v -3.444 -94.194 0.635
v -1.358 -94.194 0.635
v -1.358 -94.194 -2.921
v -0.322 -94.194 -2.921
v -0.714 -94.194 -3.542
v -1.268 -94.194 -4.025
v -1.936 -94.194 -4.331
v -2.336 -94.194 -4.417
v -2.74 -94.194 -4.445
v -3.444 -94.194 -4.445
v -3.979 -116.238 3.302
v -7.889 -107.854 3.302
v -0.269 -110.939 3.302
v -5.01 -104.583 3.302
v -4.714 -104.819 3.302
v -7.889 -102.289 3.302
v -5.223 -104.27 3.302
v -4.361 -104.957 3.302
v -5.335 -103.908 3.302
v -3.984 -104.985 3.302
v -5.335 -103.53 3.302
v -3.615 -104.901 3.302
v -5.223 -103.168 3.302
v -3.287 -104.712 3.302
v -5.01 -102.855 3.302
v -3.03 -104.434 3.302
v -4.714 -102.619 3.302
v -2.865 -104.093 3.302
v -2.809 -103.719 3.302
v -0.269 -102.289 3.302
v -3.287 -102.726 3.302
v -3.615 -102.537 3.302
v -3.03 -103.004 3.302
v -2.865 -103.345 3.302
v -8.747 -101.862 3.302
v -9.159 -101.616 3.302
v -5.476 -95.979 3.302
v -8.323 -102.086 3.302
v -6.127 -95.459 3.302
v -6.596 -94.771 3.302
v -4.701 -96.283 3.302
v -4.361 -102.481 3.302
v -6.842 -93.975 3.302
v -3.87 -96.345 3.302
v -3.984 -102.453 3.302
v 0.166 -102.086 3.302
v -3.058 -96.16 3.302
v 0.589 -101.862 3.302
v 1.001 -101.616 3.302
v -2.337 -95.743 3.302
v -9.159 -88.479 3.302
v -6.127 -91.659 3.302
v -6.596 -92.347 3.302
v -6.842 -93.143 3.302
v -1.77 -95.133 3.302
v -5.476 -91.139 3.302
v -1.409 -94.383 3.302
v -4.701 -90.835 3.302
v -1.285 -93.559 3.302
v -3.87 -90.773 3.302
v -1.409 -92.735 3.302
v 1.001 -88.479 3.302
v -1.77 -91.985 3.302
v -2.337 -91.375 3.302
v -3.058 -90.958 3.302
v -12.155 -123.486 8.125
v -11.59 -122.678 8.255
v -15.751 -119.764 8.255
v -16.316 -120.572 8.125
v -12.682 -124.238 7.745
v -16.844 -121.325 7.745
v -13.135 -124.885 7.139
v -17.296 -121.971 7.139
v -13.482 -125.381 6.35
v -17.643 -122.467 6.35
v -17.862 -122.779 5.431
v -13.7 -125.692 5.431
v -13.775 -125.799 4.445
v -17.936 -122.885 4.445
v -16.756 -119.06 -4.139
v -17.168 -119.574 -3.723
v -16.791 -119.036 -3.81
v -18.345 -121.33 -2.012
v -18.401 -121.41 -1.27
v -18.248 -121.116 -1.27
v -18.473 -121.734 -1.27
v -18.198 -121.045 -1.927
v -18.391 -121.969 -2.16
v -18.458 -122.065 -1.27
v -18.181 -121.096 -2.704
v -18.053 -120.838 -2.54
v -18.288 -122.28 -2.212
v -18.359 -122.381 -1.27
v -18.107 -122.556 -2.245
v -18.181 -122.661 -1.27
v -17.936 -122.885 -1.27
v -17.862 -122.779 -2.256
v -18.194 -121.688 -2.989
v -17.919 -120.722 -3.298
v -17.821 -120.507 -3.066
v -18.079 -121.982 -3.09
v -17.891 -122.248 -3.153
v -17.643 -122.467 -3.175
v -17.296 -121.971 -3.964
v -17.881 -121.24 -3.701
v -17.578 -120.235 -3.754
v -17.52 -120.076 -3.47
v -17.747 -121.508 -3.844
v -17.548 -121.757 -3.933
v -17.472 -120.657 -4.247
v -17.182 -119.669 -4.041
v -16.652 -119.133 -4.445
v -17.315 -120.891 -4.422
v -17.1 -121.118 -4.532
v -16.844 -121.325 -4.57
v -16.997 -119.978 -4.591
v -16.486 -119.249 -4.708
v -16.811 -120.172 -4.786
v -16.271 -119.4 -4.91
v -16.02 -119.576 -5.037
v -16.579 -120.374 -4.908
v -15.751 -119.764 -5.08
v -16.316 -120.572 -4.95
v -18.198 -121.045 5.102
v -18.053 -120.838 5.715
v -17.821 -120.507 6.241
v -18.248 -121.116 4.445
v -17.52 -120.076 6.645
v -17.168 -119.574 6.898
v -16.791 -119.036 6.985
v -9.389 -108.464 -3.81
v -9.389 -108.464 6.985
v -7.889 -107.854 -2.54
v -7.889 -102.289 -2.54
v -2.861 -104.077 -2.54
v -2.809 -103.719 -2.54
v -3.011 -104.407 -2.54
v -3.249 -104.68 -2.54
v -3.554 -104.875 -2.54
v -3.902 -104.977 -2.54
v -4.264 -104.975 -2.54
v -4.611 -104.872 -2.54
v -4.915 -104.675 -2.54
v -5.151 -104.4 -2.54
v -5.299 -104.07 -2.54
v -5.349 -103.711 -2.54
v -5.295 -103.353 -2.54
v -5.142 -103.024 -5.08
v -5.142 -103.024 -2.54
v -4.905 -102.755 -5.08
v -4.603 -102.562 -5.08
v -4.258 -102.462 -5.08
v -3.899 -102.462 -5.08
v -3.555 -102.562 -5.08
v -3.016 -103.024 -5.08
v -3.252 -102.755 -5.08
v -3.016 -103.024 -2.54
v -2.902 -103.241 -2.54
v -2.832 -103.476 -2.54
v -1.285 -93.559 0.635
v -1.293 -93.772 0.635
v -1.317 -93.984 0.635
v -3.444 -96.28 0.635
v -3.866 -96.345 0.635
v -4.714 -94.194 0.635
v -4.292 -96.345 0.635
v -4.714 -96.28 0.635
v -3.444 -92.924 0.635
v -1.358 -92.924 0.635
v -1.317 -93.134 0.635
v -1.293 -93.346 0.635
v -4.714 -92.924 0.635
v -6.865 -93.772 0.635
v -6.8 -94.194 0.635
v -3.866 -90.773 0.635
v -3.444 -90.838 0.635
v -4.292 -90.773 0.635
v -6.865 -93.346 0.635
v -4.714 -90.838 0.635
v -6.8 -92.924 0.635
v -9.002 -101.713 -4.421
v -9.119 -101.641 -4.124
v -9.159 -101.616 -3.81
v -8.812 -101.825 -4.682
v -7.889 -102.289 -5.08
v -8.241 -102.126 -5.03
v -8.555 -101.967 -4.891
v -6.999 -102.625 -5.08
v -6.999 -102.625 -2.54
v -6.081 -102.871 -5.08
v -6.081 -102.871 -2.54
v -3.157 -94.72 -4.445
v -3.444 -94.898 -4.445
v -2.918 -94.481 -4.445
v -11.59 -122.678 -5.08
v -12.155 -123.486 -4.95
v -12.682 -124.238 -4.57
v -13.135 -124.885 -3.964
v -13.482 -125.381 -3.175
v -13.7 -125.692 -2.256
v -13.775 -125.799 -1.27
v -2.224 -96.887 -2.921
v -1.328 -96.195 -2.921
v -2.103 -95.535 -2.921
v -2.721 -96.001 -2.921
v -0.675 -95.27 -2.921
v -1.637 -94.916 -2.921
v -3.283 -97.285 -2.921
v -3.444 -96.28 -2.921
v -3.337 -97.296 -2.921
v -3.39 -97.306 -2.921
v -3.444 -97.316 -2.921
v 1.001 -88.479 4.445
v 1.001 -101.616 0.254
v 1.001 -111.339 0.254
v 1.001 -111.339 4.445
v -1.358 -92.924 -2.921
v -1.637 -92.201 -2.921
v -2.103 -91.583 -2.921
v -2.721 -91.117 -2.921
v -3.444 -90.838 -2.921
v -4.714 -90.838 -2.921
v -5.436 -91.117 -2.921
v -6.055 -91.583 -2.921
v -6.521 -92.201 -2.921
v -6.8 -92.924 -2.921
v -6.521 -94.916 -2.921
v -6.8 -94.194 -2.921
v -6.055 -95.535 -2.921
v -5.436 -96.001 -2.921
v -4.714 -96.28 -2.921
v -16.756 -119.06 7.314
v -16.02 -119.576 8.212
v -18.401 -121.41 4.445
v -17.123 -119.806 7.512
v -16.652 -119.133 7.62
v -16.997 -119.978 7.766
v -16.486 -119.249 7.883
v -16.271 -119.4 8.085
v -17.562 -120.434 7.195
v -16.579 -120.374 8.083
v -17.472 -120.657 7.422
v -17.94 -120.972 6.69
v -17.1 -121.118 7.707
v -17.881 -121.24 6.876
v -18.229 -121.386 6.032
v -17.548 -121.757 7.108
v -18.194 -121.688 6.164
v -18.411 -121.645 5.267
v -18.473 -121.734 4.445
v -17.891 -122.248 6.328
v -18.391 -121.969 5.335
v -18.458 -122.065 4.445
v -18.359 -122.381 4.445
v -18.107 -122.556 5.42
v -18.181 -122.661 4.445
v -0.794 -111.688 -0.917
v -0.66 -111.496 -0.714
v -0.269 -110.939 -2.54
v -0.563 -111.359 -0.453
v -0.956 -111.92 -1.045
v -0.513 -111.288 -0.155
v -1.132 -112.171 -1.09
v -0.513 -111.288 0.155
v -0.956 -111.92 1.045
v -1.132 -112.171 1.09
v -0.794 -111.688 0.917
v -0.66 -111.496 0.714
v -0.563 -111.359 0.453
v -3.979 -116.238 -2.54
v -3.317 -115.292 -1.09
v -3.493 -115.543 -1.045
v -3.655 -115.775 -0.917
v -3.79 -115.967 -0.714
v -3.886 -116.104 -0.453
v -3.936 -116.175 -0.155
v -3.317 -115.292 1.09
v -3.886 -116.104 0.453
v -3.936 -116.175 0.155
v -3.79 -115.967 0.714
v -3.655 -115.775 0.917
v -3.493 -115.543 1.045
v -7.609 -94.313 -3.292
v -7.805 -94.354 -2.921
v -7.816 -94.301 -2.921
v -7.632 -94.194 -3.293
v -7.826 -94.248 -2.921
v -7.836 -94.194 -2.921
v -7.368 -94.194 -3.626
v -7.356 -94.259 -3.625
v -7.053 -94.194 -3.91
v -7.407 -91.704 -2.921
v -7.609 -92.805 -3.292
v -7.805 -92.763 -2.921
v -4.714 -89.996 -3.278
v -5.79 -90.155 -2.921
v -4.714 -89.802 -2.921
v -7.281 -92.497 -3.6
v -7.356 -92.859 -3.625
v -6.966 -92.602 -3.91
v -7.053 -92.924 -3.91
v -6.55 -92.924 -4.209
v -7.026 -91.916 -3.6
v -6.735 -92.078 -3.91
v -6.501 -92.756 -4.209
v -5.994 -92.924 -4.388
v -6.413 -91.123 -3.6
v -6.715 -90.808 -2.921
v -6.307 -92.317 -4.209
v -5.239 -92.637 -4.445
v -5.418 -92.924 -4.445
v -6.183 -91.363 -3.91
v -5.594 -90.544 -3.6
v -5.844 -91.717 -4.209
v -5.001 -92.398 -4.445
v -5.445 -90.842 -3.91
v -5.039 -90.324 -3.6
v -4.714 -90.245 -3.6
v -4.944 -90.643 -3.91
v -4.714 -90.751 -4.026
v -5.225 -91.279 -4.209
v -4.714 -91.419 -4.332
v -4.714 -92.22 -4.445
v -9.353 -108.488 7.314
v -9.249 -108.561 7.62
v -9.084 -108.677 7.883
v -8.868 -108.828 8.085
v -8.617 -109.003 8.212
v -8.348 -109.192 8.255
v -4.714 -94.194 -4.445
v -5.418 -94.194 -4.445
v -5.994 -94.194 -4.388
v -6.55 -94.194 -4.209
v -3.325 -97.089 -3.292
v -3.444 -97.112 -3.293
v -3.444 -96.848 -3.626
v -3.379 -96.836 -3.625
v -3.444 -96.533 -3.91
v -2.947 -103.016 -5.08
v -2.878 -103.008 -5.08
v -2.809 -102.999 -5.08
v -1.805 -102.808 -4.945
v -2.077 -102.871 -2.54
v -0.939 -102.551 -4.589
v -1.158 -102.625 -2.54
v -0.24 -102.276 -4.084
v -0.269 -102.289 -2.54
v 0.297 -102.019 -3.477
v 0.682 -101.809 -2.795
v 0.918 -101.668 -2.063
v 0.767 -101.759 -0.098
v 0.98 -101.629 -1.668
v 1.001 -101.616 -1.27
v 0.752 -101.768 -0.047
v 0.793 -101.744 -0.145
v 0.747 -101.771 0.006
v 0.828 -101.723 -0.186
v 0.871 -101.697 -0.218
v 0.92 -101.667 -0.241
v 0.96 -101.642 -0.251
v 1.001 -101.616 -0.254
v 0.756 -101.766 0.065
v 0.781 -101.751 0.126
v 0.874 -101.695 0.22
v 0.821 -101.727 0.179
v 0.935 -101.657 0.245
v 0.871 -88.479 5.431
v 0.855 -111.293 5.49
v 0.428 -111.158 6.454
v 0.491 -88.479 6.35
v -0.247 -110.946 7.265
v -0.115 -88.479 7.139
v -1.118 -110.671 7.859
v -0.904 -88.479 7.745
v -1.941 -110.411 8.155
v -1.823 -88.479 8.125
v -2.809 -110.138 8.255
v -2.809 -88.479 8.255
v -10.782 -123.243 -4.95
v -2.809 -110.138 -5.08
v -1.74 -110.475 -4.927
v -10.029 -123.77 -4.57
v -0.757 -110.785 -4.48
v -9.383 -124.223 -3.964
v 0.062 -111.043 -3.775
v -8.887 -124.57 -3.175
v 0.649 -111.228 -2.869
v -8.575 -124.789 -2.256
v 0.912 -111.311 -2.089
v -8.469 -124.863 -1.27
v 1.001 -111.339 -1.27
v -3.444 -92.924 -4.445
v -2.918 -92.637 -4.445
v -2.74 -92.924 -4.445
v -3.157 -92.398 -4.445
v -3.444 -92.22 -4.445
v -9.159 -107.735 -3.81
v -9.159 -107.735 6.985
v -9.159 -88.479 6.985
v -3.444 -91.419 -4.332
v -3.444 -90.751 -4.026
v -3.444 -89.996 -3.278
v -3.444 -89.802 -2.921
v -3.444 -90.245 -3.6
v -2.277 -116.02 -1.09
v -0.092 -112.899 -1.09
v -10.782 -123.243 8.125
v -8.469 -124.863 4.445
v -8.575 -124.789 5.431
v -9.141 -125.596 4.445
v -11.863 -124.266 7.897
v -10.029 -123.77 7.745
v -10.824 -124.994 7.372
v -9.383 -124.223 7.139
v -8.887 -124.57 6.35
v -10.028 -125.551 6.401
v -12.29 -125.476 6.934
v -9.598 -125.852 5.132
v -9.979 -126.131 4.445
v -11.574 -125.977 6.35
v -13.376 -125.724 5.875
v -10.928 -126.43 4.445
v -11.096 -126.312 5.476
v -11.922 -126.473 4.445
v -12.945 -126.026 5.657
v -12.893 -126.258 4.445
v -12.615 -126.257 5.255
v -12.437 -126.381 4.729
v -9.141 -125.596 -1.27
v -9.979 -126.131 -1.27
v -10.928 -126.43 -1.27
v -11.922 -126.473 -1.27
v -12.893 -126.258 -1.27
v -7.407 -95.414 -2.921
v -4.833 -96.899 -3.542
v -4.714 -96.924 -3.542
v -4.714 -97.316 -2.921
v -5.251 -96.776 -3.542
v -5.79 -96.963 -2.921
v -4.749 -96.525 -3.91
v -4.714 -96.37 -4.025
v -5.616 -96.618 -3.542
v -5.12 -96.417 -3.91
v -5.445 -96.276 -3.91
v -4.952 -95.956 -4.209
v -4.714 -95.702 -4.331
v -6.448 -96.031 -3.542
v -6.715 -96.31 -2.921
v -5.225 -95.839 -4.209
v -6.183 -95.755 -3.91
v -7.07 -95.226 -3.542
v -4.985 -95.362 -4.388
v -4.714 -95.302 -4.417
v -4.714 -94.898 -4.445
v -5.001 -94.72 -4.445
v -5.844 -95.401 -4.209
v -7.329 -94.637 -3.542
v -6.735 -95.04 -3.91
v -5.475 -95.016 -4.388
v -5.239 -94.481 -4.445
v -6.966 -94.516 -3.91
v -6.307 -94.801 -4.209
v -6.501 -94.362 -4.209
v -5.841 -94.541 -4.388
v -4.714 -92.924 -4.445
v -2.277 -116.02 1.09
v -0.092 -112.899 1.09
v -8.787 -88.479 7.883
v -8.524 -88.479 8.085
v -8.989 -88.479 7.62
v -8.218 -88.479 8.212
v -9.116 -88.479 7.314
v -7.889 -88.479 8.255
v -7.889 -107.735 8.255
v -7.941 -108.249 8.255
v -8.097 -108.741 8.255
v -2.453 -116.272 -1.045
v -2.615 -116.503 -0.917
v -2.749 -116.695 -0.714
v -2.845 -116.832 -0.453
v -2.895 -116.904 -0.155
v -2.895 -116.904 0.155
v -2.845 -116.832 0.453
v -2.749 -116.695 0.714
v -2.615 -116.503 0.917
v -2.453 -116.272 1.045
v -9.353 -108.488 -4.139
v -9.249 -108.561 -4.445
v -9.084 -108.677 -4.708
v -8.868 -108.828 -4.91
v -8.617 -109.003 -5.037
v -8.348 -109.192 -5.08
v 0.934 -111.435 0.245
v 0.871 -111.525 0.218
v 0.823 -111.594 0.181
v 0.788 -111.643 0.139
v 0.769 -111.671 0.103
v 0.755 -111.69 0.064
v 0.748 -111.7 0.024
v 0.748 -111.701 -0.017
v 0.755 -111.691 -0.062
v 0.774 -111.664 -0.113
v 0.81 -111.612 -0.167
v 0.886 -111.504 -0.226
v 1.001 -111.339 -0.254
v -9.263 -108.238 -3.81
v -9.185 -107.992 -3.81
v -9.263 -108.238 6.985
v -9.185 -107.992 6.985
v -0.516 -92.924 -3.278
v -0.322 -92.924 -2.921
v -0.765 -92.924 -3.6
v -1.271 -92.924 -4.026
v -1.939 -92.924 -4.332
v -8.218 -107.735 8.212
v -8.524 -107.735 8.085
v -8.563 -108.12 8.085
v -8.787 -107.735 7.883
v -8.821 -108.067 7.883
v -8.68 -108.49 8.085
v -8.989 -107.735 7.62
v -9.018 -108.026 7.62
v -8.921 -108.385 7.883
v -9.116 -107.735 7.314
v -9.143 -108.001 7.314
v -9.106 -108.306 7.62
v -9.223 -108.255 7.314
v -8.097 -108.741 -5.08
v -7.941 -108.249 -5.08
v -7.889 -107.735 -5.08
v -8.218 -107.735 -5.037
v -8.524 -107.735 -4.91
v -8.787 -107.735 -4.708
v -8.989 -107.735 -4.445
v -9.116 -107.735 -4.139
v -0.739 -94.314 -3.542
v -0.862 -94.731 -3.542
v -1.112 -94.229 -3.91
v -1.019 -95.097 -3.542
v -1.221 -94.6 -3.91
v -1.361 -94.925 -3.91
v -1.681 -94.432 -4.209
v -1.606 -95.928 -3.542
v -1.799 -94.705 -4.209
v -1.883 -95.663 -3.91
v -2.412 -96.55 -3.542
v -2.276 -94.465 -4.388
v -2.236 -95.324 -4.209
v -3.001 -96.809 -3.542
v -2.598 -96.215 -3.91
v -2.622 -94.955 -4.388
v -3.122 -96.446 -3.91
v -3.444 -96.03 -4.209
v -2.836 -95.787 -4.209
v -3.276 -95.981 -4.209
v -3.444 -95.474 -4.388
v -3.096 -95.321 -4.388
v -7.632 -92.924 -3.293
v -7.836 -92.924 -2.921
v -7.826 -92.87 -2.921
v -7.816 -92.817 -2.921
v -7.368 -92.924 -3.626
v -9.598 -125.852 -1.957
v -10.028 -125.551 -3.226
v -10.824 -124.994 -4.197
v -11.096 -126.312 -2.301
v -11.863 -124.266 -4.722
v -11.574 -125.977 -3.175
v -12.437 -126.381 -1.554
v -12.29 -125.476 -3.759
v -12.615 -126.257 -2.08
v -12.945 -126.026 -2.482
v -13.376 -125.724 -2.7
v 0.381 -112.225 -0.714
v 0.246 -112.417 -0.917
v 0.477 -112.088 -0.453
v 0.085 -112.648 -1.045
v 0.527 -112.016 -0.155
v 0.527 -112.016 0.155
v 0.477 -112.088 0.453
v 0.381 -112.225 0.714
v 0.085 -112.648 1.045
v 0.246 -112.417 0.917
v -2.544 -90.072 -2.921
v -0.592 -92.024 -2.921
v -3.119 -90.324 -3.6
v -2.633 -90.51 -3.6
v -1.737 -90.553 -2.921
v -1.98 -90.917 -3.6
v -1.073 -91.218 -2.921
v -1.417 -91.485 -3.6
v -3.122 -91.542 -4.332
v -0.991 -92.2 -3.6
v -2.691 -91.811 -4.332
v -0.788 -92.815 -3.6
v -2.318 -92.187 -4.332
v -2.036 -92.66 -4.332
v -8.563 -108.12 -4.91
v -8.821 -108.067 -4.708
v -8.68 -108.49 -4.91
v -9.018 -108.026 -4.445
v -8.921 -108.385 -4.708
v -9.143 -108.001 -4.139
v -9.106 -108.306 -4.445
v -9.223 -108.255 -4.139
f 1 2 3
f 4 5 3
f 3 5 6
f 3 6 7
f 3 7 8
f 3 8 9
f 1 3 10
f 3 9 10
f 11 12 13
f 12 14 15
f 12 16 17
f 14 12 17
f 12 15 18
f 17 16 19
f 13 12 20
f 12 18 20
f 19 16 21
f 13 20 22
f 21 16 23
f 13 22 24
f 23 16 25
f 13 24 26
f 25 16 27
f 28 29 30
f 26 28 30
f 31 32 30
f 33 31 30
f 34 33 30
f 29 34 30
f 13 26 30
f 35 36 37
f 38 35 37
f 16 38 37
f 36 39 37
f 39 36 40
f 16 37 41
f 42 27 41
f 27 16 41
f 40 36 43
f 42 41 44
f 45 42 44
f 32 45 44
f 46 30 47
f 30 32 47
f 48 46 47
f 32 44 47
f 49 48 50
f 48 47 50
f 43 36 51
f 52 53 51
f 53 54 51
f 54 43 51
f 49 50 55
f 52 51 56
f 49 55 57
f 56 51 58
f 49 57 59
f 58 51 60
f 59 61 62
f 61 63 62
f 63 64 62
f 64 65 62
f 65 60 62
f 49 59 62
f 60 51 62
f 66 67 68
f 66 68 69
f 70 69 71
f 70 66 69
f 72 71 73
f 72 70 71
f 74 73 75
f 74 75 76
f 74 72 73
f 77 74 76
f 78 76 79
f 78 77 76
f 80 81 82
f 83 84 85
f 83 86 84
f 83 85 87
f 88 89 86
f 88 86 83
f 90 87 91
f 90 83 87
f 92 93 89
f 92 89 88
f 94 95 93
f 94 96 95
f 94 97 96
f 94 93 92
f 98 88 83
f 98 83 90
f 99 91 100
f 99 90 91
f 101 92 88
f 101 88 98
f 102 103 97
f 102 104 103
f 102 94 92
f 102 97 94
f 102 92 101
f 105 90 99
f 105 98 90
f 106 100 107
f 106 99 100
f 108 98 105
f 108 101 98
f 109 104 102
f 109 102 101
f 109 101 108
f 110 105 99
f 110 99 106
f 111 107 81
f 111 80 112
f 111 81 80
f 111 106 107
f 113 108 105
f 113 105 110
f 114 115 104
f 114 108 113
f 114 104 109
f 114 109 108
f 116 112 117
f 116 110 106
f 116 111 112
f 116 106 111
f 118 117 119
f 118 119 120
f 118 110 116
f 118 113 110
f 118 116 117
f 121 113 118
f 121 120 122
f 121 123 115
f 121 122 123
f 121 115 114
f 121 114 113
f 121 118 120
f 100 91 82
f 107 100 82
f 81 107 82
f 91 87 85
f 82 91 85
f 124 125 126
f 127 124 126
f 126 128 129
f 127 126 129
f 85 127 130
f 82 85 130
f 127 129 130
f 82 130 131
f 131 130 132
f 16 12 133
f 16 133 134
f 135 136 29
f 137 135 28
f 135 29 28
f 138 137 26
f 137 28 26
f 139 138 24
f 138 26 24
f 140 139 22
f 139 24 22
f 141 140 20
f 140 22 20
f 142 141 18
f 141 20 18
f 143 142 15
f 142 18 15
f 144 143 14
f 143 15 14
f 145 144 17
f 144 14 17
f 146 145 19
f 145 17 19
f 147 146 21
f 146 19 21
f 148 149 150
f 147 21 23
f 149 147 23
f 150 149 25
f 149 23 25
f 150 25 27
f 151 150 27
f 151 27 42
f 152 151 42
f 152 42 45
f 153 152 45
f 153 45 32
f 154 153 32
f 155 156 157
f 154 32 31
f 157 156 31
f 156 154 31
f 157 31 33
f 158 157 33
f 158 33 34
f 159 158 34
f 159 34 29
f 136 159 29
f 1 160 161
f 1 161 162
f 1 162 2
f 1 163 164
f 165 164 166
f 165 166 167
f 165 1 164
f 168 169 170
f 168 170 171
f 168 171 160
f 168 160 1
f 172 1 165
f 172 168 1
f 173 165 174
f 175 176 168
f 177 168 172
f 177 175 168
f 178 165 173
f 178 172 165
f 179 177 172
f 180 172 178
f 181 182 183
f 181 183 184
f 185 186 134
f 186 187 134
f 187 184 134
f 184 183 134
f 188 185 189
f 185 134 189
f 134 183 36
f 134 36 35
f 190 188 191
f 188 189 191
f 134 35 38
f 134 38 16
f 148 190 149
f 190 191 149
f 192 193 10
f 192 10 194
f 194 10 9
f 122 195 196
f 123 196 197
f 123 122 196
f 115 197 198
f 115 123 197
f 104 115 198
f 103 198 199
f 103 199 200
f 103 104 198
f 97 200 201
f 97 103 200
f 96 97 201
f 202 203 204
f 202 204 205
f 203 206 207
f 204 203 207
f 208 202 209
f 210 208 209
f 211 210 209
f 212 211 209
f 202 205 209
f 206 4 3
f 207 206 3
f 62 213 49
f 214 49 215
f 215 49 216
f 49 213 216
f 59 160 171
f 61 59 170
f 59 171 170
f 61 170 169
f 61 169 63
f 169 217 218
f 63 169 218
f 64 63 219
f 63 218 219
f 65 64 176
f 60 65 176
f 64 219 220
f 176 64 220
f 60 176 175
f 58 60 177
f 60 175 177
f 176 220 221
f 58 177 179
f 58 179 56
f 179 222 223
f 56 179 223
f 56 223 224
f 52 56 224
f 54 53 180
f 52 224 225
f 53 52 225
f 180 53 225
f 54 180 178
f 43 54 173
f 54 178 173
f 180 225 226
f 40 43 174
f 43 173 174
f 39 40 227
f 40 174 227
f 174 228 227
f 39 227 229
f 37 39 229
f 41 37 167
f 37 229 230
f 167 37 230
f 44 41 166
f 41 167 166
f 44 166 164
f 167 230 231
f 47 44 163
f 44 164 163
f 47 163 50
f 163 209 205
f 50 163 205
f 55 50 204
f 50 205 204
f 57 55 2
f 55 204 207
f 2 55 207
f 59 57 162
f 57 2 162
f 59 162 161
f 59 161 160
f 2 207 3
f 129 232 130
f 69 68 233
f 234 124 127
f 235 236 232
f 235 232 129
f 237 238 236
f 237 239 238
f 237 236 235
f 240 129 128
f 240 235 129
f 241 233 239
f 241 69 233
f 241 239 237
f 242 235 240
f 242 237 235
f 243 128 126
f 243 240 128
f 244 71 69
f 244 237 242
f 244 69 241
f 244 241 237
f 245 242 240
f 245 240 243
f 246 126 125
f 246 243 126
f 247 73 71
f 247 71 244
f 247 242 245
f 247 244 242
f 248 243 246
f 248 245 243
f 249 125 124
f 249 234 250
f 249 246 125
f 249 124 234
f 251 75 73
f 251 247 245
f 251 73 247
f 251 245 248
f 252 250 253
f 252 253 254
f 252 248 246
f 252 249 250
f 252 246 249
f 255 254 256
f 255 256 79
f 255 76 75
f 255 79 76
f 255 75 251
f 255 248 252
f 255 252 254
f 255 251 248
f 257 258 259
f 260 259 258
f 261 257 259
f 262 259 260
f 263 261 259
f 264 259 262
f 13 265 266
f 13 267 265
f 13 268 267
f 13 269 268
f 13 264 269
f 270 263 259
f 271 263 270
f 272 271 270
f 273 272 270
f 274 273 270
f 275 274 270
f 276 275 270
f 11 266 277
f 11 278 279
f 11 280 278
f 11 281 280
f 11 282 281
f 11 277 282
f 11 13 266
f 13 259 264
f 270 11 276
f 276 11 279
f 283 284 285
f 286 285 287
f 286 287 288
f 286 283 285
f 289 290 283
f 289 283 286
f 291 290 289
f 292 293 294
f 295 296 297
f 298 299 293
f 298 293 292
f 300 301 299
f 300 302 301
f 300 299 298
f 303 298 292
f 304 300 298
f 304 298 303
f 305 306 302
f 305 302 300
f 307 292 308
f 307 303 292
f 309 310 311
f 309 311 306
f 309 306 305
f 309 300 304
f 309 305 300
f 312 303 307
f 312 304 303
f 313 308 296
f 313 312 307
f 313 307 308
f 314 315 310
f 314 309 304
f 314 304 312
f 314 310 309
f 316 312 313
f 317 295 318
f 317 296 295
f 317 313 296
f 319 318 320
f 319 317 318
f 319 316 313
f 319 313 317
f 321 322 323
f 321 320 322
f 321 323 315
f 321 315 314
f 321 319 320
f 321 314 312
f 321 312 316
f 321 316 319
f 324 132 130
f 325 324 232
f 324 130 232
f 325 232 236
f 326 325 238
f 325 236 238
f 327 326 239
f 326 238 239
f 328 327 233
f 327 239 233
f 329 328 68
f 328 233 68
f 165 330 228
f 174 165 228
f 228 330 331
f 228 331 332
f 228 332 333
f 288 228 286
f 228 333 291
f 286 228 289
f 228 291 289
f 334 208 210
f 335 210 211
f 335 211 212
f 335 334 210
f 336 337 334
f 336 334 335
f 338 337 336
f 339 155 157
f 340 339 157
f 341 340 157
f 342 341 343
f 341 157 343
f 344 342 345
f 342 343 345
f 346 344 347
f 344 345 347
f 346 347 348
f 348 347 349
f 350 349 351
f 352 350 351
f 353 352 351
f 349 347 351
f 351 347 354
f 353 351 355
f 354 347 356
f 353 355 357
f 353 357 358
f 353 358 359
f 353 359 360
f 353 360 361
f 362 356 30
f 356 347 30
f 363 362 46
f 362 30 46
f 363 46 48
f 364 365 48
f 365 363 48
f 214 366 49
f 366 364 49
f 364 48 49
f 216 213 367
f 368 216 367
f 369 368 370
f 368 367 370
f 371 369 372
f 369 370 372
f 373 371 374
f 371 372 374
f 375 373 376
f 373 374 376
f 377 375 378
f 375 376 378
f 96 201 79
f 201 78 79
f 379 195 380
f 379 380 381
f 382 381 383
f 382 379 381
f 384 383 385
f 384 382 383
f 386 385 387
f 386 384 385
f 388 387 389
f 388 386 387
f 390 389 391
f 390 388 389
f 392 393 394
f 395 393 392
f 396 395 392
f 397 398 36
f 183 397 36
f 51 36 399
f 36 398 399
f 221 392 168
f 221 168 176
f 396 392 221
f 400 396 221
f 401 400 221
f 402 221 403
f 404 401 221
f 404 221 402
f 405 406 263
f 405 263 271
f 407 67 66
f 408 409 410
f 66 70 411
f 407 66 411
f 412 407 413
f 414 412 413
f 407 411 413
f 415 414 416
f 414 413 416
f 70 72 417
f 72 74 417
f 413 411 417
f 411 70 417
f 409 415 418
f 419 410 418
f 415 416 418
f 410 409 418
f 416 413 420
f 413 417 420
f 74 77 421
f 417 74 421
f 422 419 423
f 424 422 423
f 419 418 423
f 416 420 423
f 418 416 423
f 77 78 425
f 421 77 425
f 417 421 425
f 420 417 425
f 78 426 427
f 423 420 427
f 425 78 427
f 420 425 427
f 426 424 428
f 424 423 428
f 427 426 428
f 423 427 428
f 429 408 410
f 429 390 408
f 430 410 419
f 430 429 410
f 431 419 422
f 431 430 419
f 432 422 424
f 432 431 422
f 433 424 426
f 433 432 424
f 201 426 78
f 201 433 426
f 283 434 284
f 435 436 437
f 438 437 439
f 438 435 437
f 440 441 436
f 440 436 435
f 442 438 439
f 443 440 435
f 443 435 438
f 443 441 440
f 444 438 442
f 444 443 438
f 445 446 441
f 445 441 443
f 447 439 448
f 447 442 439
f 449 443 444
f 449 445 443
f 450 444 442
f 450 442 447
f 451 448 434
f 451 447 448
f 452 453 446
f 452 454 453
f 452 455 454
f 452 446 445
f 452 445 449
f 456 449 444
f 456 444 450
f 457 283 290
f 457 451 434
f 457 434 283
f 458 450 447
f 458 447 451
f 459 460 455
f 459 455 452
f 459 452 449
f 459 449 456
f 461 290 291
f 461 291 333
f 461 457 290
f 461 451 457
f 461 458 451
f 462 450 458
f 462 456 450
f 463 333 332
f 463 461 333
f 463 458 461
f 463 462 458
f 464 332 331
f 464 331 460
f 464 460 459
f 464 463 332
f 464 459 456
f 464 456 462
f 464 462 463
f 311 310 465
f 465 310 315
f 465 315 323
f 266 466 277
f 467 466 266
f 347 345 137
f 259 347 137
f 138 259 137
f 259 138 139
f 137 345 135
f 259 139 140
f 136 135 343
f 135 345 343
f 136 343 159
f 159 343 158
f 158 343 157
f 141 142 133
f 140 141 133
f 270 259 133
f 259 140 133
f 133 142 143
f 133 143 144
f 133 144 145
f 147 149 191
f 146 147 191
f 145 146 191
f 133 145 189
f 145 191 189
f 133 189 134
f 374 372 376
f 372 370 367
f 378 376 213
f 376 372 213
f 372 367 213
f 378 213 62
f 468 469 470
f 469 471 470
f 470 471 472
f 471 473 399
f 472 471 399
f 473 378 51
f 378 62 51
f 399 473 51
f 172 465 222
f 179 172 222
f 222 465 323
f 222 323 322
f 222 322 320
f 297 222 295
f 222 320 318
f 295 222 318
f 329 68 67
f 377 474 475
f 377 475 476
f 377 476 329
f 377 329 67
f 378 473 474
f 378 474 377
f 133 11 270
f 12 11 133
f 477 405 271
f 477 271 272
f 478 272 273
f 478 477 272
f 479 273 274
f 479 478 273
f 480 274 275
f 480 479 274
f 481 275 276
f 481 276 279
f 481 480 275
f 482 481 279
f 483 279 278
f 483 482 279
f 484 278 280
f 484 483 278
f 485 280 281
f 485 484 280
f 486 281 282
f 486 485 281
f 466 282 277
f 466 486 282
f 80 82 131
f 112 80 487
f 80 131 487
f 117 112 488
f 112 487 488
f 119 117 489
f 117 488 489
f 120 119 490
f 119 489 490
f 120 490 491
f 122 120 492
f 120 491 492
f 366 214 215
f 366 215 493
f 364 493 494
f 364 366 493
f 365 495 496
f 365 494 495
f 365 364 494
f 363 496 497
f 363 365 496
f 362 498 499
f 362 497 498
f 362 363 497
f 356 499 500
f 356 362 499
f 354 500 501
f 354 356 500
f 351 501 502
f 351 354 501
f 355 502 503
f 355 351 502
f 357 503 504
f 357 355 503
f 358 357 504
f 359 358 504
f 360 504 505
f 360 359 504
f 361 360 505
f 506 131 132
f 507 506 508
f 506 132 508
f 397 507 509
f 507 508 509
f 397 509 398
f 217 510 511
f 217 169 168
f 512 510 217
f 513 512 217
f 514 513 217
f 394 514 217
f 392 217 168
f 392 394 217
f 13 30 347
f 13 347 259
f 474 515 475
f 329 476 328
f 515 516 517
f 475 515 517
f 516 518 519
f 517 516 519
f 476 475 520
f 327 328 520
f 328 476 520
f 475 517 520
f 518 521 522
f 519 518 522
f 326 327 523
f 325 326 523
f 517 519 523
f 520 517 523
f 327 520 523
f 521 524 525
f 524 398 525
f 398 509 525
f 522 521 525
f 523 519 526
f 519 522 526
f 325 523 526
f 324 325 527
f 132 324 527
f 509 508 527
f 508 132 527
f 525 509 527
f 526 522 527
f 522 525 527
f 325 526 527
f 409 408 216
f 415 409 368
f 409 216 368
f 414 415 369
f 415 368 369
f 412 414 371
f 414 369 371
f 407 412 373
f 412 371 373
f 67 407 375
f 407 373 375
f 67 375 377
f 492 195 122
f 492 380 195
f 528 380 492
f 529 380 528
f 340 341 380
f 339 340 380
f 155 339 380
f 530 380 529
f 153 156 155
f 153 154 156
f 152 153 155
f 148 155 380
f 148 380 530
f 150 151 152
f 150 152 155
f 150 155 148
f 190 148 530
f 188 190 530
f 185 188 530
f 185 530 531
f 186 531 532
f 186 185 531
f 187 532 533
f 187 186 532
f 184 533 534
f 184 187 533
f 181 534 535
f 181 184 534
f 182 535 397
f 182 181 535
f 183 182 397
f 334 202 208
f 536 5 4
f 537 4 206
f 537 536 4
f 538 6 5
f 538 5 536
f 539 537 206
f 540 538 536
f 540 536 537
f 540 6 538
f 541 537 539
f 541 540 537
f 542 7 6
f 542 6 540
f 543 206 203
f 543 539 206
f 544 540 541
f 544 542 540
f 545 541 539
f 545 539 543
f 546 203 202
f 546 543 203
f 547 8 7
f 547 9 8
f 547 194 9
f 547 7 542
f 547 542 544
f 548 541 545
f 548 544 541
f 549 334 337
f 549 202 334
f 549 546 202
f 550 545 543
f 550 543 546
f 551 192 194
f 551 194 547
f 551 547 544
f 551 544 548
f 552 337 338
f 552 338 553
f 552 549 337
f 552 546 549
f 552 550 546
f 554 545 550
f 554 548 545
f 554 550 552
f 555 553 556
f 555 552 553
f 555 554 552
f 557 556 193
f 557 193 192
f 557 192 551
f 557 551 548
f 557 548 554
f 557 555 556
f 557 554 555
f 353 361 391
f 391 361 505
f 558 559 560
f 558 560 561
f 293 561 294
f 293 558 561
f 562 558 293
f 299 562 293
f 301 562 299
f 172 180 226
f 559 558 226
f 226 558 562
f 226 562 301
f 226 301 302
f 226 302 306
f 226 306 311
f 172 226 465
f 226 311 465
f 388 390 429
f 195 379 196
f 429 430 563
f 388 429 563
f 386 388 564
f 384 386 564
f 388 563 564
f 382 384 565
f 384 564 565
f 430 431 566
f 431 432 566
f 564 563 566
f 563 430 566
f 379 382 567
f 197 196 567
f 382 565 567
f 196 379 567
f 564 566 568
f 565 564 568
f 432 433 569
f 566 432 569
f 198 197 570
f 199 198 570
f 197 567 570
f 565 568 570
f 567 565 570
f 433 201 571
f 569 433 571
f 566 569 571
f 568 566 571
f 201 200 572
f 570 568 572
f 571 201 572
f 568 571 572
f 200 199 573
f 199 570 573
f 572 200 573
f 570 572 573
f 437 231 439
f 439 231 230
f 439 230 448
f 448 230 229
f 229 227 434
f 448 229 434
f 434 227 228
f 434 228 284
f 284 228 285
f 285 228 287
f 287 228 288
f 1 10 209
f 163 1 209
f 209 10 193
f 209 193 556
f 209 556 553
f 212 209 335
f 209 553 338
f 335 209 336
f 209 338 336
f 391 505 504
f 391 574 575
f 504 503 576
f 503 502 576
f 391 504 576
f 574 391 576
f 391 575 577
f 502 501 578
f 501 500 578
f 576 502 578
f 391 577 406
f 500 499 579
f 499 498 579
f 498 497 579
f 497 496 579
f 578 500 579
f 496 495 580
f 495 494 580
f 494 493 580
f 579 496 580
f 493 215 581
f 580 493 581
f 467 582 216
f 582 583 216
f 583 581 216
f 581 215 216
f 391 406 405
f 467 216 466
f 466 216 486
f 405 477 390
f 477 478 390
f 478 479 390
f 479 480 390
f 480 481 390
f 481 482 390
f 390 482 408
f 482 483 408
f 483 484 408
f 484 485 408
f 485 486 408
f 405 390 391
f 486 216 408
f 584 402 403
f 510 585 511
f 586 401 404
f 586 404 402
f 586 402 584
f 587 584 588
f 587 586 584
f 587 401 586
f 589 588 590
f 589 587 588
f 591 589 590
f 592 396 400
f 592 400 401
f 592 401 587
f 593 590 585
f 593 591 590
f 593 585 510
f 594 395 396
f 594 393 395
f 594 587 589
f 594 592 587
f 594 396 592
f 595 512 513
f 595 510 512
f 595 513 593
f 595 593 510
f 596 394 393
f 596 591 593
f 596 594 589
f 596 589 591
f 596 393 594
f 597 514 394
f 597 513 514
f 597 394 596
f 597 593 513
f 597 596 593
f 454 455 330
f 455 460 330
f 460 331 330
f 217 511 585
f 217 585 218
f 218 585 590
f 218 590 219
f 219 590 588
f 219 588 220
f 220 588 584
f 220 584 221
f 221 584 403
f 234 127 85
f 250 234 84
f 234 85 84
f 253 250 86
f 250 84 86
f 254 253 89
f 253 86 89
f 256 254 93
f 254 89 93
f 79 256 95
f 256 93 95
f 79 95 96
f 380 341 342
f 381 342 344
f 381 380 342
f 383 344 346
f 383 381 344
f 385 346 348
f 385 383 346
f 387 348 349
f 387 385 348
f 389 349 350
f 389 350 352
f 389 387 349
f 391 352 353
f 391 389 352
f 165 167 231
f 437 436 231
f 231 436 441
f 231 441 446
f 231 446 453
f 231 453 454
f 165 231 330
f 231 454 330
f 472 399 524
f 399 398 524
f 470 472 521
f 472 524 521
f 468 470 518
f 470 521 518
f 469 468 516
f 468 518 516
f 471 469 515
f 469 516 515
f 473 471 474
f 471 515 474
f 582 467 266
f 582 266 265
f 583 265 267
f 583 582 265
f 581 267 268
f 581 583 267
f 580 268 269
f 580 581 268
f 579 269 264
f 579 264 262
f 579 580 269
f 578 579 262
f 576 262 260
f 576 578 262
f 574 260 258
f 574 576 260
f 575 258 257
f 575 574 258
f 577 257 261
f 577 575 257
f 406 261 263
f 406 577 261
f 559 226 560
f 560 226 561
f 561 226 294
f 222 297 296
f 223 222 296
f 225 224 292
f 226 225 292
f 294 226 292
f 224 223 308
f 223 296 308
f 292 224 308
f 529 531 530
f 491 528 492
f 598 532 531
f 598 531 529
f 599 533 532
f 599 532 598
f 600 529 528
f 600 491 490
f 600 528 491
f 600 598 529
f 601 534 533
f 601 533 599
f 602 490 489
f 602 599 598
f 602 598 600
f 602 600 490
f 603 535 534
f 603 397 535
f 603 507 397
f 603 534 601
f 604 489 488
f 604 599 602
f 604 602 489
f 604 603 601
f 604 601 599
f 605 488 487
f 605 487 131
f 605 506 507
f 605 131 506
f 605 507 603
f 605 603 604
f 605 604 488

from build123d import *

# Parameters (mm, degrees)
BOSS_EXTRUDE1_DEPTH      = 5.715
BOSS_EXTRUDE1_DEPTH_BACK = 4.445
SKETCH2_R                = 2.7940000000000054
SKETCH3_W                = 1.269999999999993
SKETCH3_H                = 1.2700000000000102
CUT_EXTRUDE1_DEPTH       = 5.08
BOSS_EXTRUDE2_DEPTH      = 1.524
FILLET1_R                = 2.54
BOSS_EXTRUDE3_DEPTH      = 2.54
BOSS_EXTRUDE3_DEPTH_BACK = 2.413
SKETCH5_R                = 2.7940000000000054
BOSS_EXTRUDE4_DEPTH      = 8.382
CUT_EXTRUDE2_START       = -1.7145
CUT_EXTRUDE2_DEPTH       = 5.8420000000000005
CUT_EXTRUDE5_DEPTH       = 1.27
BOSS_EXTRUDE5_REACH      = 131.655
SKETCH11_R               = 1.2700000000000067
CUT_EXTRUDE6_DEPTH       = 31.835580227886044
CUT_EXTRUDE6_DEPTH_BACK  = 31.835580227886044
SKETCH12_R               = 0.25399999999999967
FILLET2_R                = 3.8099999999999996
FILLET3_R                = 3.8099999999999996
FILLET4_R                = 1.27


with BuildPart() as part:
    # Sketch2 → Boss-Extrude1 (new, two sides: drawn at the far end of the back side and taken through both)
    with BuildSketch(Plane.XY.offset(-BOSS_EXTRUDE1_DEPTH_BACK)):
        with Locations((-4.07886393202022, -93.55895801032833)):
            Circle(SKETCH2_R)
    extrude(amount=BOSS_EXTRUDE1_DEPTH + BOSS_EXTRUDE1_DEPTH_BACK)

    # Sketch3 → Cut-Extrude1 (cut)
    with BuildSketch(Plane(origin=(0, 0, -4.445), x_dir=(-1, 0, 0), z_dir=(0, 0, -1))):
        with BuildLine():
            Line((3.443863932020214, -94.1939580103283), (3.443863932020214, -92.9239580103283))
            Line((3.4438639320202142, -92.9239580103283), (1.357979700745413, -92.9239580103283))
            ThreePointArc((1.3579797007454042, -92.92395801032826), (1.3032030609678973, -93.23936024921431), (1.2848639320202149, -93.55895801032833))
            ThreePointArc((1.2848639320202149, -93.55895801032833), (1.3032030609678946, -93.87855577144232), (1.3579797007453935, -94.19395801032834))
            Line((1.357979700745402, -94.1939580103283), (3.4438639320202142, -94.1939580103283))
        make_face()
        with Locations((4.0788639320202105, -93.5589580103283)):
            Rectangle(SKETCH3_W, SKETCH3_H)
        with BuildLine():
            ThreePointArc((4.713863932020238, -90.8380737790535), (4.398461693134176, -90.783297139276), (4.078863932020155, -90.76495801032831))
            ThreePointArc((4.078863932020155, -90.76495801032831), (3.7592661709062294, -90.783297139276), (3.4438639320202613, -90.83807377905349))
            Line((3.4438639320202147, -90.83807377905347), (3.443863932020214, -92.9239580103283))
            Line((3.4438639320202142, -92.9239580103283), (4.713863932020207, -92.9239580103283))
            Line((4.713863932020207, -92.9239580103283), (4.713863932020208, -90.8380737790535))
        make_face()
        with BuildLine():
            Line((6.7997481632950585, -92.9239580103283), (4.713863932020207, -92.9239580103283))
            Line((4.713863932020207, -92.9239580103283), (4.713863932020207, -94.1939580103283))
            Line((4.713863932020207, -94.1939580103283), (6.7997481632950665, -94.1939580103283))
            ThreePointArc((6.79974816329506, -94.19395801032829), (6.854524803072549, -93.87855577144228), (6.872863932020225, -93.55895801032833))
            ThreePointArc((6.872863932020225, -93.55895801032833), (6.854524803072548, -93.23936024921436), (6.799748163295054, -92.92395801032833))
        make_face()
        with BuildLine():
            Line((4.713863932020207, -94.1939580103283), (3.4438639320202142, -94.1939580103283))
            Line((3.443863932020214, -94.1939580103283), (3.443863932020213, -96.27984224160318))
            ThreePointArc((3.4438639320202564, -96.27984224160316), (3.759266170906339, -96.33461888138066), (4.078863932020378, -96.35295801032834))
            ThreePointArc((4.078863932020378, -96.35295801032834), (4.398461693134285, -96.33461888138064), (4.713863932020234, -96.27984224160315))
            Line((4.713863932020206, -96.27984224160315), (4.713863932020207, -94.1939580103283))
        make_face()
    extrude(amount=-CUT_EXTRUDE1_DEPTH, mode=Mode.SUBTRACT)

    # Sketch4 → Boss-Extrude2 (add)
    with BuildSketch(Plane(origin=(0, 0, -4.445), x_dir=(-1, 0, 0), z_dir=(0, 0, -1))):
        with BuildLine():
            Line((0.3221532697519658, -92.9239580103283), (1.3579797007453926, -92.9239580103283))
            ThreePointArc((1.3579797007453926, -92.9239580103283), (2.1032075853849994, -91.58330166369309), (3.443863932020213, -90.83807377905349))
            Line((3.4438639320202116, -90.83807377905349), (3.443863932020211, -89.80224734806006))
            ThreePointArc((3.443863932020212, -89.80224734806006), (1.3847870956994783, -90.86488117400758), (0.32215326975196623, -92.9239580103283))
        make_face()
        with BuildLine():
            Line((3.4438639320202147, -97.31566867259657), (3.4438639320202142, -96.27984224160315))
            ThreePointArc((3.443863932020213, -96.27984224160315), (2.1032075853849905, -95.53461435696353), (1.3579797007453847, -94.1939580103283))
            Line((1.3579797007453842, -94.1939580103283), (0.32215326975196246, -94.1939580103283))
            ThreePointArc((0.3221532697519591, -94.1939580103283), (1.384787095699461, -96.25303484664906), (3.443863932020211, -97.31566867259659))
        make_face()
        with BuildLine():
            Line((4.713863932020205, -96.27984224160316), (4.713863932020205, -97.31566867259659))
            ThreePointArc((4.713863932020205, -97.31566867259659), (6.772940768340969, -96.25303484664907), (7.835574594288481, -94.1939580103283))
            Line((7.835574594288476, -94.1939580103283), (6.799748163295055, -94.1939580103283))
            ThreePointArc((6.799748163295052, -94.1939580103283), (6.054520278655444, -95.53461435696354), (4.713863932020207, -96.27984224160316))
        make_face()
        with BuildLine():
            Line((4.713863932020206, -89.80224734806005), (4.713863932020206, -90.83807377905347))
            ThreePointArc((4.713863932020206, -90.83807377905347), (6.054520278655427, -91.58330166369309), (6.799748163295051, -92.9239580103283))
            Line((6.799748163295051, -92.9239580103283), (7.835574594288472, -92.9239580103283))
            ThreePointArc((7.835574594288474, -92.9239580103283), (6.772940768340954, -90.86488117400756), (4.713863932020203, -89.80224734806006))
        make_face()
    extrude(amount=-BOSS_EXTRUDE2_DEPTH)

    # Fillet1
    # the kernel refuses this fillet: 2.54 mm, written as the material it takes off along each edge
    with BuildSketch(Plane(origin=(-4.0788639320202495, -93.55895801032834, -4.445), x_dir=(-0.9779601169479317, 0.2087917854207577, 0), z_dir=(-0.2087917854207577, -0.9779601169479317, 0))) as fillet1_piece_1:
        with BuildLine():
            CenterArc((1.4820515469624638, -2.54), FILLET1_R, 23.578178478201842, 66.42182152179817)
            Line((1.4820515469624638, 0), (1.4820515469624638, 0.05079999999999973))
            Line((1.4820515469624638, 0.05079999999999973), (3.8100000000000294, 0.05079999999999973))
            Line((3.8100000000000294, 0.05079999999999973), (3.8608000000000278, 0))
            ThreePointArc((3.8608000000000278, 0), (3.860800000000029, -0.762), (3.8565589690607793, -1.5036800000000001))
            Line((3.8565589690607793, -1.5036800000000001), (3.81000000000003, -1.524))
        make_face()
    revolve(axis=Axis((-4.0788639320202495, -93.55895801032834, -4.445), (0, 0, -1)), revolution_arc=245.89688563167445, mode=Mode.SUBTRACT)
    with BuildSketch(Plane(origin=(-4.078863932020237, -93.55895801032833, -4.445), x_dir=(0.20879178542072774, 0.9779601169479382, 0), z_dir=(-0.9779601169479382, 0.20879178542072774, 0))) as fillet1_piece_2:
        with BuildLine():
            CenterArc((1.4820515469624473, -2.54), FILLET1_R, 23.578178478201917, 66.42182152179808)
            Line((1.4820515469624473, 0), (1.4820515469624473, 0.05079999999999973))
            Line((1.4820515469624473, 0.05079999999999973), (3.8100000000000094, 0.05079999999999973))
            Line((3.8100000000000094, 0.05079999999999973), (3.8608000000000127, 0))
            ThreePointArc((3.8608000000000127, 0), (3.8608000000000127, -0.7619999999999991), (3.8565589690607562, -1.5036799999999984))
            Line((3.8565589690607562, -1.5036799999999984), (3.810000000000009, -1.5239999999999982))
        make_face()
    revolve(axis=Axis((-4.078863932020237, -93.55895801032833, -4.445), (0, 0, -1)), revolution_arc=245.89688563167698, mode=Mode.SUBTRACT)
    with BuildSketch(Plane(origin=(-4.078863932020216, -93.55895801032833, -4.445), x_dir=(0.9779601169479387, -0.2087917854207255, 0), z_dir=(0.2087917854207255, 0.9779601169479387, 0))) as fillet1_piece_3:
        with BuildLine():
            CenterArc((1.482051546962437, -2.5400000000000005), FILLET1_R, 23.578178478201817, 66.42182152179818)
            Line((1.482051546962437, 0), (1.482051546962437, 0.05079999999999975))
            Line((1.482051546962437, 0.05079999999999975), (3.8100000000000045, 0.05079999999999975))
            Line((3.8100000000000045, 0.05079999999999975), (3.860800000000004, 0))
            ThreePointArc((3.860800000000004, 0), (3.860800000000005, -0.7620000000000007), (3.856558969060754, -1.503680000000001))
            Line((3.856558969060754, -1.503680000000001), (3.810000000000004, -1.524000000000001))
        make_face()
    revolve(axis=Axis((-4.078863932020216, -93.55895801032833, -4.445), (0, 0, -1)), revolution_arc=245.89688563167826, mode=Mode.SUBTRACT)
    with BuildSketch(Plane(origin=(-4.078863932020221, -93.55895801032833, -4.445), x_dir=(-0.20879178542073795, -0.9779601169479358, 0), z_dir=(0.9779601169479358, -0.20879178542073795, 0))) as fillet1_piece_4:
        with BuildLine():
            CenterArc((1.482051546962436, -2.5399999999999996), FILLET1_R, 23.57817847820183, 66.42182152179817)
            Line((1.482051546962436, 0), (1.482051546962436, 0.05079999999999972))
            Line((1.482051546962436, 0.05079999999999972), (3.8100000000000027, 0.05079999999999972))
            Line((3.8100000000000027, 0.05079999999999972), (3.8608000000000064, 0))
            ThreePointArc((3.8608000000000064, 0), (3.8608000000000064, -0.7619999999999998), (3.85655896906075, -1.5036799999999997))
            Line((3.85655896906075, -1.5036799999999997), (3.8100000000000027, -1.5239999999999996))
        make_face()
    revolve(axis=Axis((-4.078863932020221, -93.55895801032833, -4.445), (0, 0, -1)), revolution_arc=245.8968856316771, mode=Mode.SUBTRACT)

    # Sketch5 → Boss-Extrude3 (add, two sides: drawn at the far end of the back side and taken through both)
    # profile 1 of 4: a face of its own
    with BuildSketch(Plane.XY.offset(5.714999999999999).offset(-BOSS_EXTRUDE3_DEPTH_BACK)):
        Polygon((-7.321448701996413, -105.51142141700173), (1.001136067979783, -111.33895801032831), (1.0011360679797812, -88.47895801032831), (-9.158863932020221, -88.47895801032831), (-9.158863932020218, -108.13552231531784), align=None)
        with Locations((-4.07886393202022, -93.55895801032833)):
            Circle(SKETCH5_R, mode=Mode.SUBTRACT)
    # profile 2 of 4: a face of its own
    with BuildSketch(Plane.XY.offset(5.714999999999999).offset(-BOSS_EXTRUDE3_DEPTH_BACK)):
        Polygon((-9.158863932020218, -111.33895801032831), (1.0011360679797825, -111.33895801032831), (-7.321448701996413, -105.51142141700173), (-9.158863932020203, -108.13552231531784), align=None)
    # profile 3 of 4: a face of its own
    with BuildSketch(Plane.XY.offset(5.714999999999999).offset(-BOSS_EXTRUDE3_DEPTH_BACK)):
        Polygon((-18.976521888649557, -122.1565909569541), (-10.653937118673376, -127.98412755028069), (1.0011360679797825, -111.33895801032831), (-9.158863932020218, -111.33895801032831), (-9.158863932020218, -108.13552231531784), align=None)
    # profile 4 of 4: a face of its own
    with BuildSketch(Plane.XY.offset(5.714999999999999).offset(-BOSS_EXTRUDE3_DEPTH_BACK)):
        with Locations((-4.07886393202022, -93.55895801032833)):
            Circle(SKETCH5_R)
    extrude(amount=BOSS_EXTRUDE3_DEPTH + BOSS_EXTRUDE3_DEPTH_BACK)

    # Sketch6 → Boss-Extrude4 (add)
    with BuildSketch(Plane(origin=(0, 0, 3.3019999999999996), x_dir=(-1, 0, 0), z_dir=(0, 0, -1))):
        with BuildLine():
            ThreePointArc((9.158863932020274, -101.61620474851374), (4.078863932020362, -103.08395801032833), (-1.0011360679795924, -101.6162047485139))
            Line((-1.0011360679797892, -101.61620474851397), (-1.0011360679797952, -111.33895801032828))
            Line((-1.0011360679797952, -111.33895801032828), (10.65393711867338, -127.98412755028066))
            Line((10.65393711867338, -127.98412755028066), (18.97652188864956, -122.1565909569541))
            Line((18.97652188864956, -122.1565909569541), (9.15886393202022, -108.13552231531789))
            Line((9.15886393202022, -108.13552231531789), (9.15886393202022, -101.61620474851372))
        make_face()
    extrude(amount=BOSS_EXTRUDE4_DEPTH)

    # Sketch9 → Cut-Extrude2 (cut)
    with BuildSketch(Plane(origin=(0, 0, 1.5874999999999995), x_dir=(-1, 0, 0), z_dir=(0, 0, -1)).offset(CUT_EXTRUDE2_START)):
        with BuildLine():
            ThreePointArc((7.8888639320202145, -102.2887647092192), (4.078863932020218, -103.08395801032832), (0.26886393202022063, -102.2887647092192))
            Line((0.2688639320202225, -102.2887647092192), (0.26886393202022346, -110.93852854845198))
            Line((0.2688639320202233, -110.93852854845198), (3.9794333963345303, -116.23777093279071))
            Line((3.9794333963345303, -116.23777093279071), (7.888863932020215, -107.85397009376136))
            Line((7.888863932020215, -107.85397009376136), (7.888863932020214, -102.2887647092192))
        make_face()
    extrude(amount=CUT_EXTRUDE2_DEPTH, mode=Mode.SUBTRACT)

    # Sketch10 → Cut-Extrude5 (cut)
    with BuildSketch(Plane(origin=(52.983971008867975, -37.099775904693615, 0), x_dir=(0, 0, -1), z_dir=(0.8191520442889951, -0.5735764363510415, 0))):
        with BuildLine():
            Line((1.0896366691639499, -92.53430700499268), (1.089636669163951, -96.34430700499269))
            ThreePointArc((1.089636669163951, -96.34430700499269), (3e-17, -97.43394367415664), (-1.0896366691639492, -96.34430700499269))
            Line((-1.0896366691639492, -96.34430700499269), (-1.0896366691639503, -92.53430700499268))
            ThreePointArc((-1.0896366691639503, -92.53430700499268), (-8.7e-16, -91.44467033582873), (1.0896366691639499, -92.53430700499268))
        make_face()
    extrude(amount=-CUT_EXTRUDE5_DEPTH, mode=Mode.SUBTRACT)

    # Boss-Extrude5: up to this face of the body (flat: up to its plane)
    boss_extrude5_end = Plane(part.part.faces().sort_by_distance((-7.766430245, -114.366891782, -5.08))[0])
    # Sketch11 → Boss-Extrude5 (add, up to the picked face)
    with BuildSketch(Plane(origin=(0, 0, 3.3019999999999996), x_dir=(-1, 0, 0), z_dir=(0, 0, -1)), mode=Mode.PRIVATE) as boss_extrude5_sk1:
        with Locations(Location((4.07886393202022, -103.71895801032832, 0), (0, 0, 180))):
            Circle(SKETCH11_R)
    boss_extrude5_tool1 = split(extrude(boss_extrude5_sk1.sketch, amount=BOSS_EXTRUDE5_REACH, mode=Mode.PRIVATE), bisect_by=boss_extrude5_end, keep=Keep.BOTH, mode=Mode.PRIVATE)
    add(boss_extrude5_tool1.solids().sort_by(Axis((-4.078864, -103.718958, 3.302), (0, 0, -1)))[0])

    # Sketch12 → Cut-Extrude6 (cut, two sides: drawn at the far end of the back side and taken through both)
    with BuildSketch(Plane(origin=(8.45e-15, -111.33895801032828, -1.1587e-13), x_dir=(-3.9e-16, 1.04e-15, -1), z_dir=(8e-17, -1, -1.04e-15)).offset(-CUT_EXTRUDE6_DEPTH_BACK)):
        with Locations((-1.1536e-13, 1.0011360679797674)):
            Circle(SKETCH12_R)
    extrude(amount=CUT_EXTRUDE6_DEPTH + CUT_EXTRUDE6_DEPTH_BACK, mode=Mode.SUBTRACT)

    # Fillet2
    fillet2_edges = [part.edges().sort_by_distance(p)[0] for p in [
        (1.001136067979782, -99.90895801032832, 8.254999999999999),
        (-4.826400525346797, -119.6615427803045, 8.254999999999999),
        (1.0011360679797923, -106.47758137942112, -5.08),
        (-4.826400525346792, -119.66154278030447, -5.08),
    ]]
    fillet(fillet2_edges, radius=FILLET2_R)

    # Fillet3
    fillet3_edges = [part.edges().sort_by_distance(p)[0] for p in [
        (-16.375714148032007, -123.97769614236866, -5.08),
        (-10.653937118673378, -127.98412755028068, 1.5874999999999995),
        (-16.375714148032, -123.97769614236866, 8.254999999999999),
        (-11.568047859470674, -127.34406031881595, 7.139076836320745),
        (-11.568047859470692, -127.34406031881595, -3.9640768363207504),
    ]]
    fillet(fillet3_edges, radius=FILLET3_R)

    # Fillet4
    fillet4_edges = [part.edges().sort_by_distance(p)[0] for p in [
        (-9.158863932020214, -108.13552231531787, 1.5874999999999995),
        (-9.15886393202022, -98.30724016282308, 8.254999999999999),
        (-9.15886393202022, -104.8758635319158, -5.08),
        (-12.975029799086151, -113.58557199176545, 8.254999999999999),
        (-18.97652188864956, -122.1565909569541, 1.5874999999999977),
        (-12.975029799086158, -113.58557199176546, -5.08),
        (-18.336454657184838, -121.2424802161568, -3.9640768363207477),
        (-18.336454657184838, -121.2424802161568, 7.139076836320744),
    ]]
    fillet(fillet4_edges, radius=FILLET4_R)


solid = part.part
